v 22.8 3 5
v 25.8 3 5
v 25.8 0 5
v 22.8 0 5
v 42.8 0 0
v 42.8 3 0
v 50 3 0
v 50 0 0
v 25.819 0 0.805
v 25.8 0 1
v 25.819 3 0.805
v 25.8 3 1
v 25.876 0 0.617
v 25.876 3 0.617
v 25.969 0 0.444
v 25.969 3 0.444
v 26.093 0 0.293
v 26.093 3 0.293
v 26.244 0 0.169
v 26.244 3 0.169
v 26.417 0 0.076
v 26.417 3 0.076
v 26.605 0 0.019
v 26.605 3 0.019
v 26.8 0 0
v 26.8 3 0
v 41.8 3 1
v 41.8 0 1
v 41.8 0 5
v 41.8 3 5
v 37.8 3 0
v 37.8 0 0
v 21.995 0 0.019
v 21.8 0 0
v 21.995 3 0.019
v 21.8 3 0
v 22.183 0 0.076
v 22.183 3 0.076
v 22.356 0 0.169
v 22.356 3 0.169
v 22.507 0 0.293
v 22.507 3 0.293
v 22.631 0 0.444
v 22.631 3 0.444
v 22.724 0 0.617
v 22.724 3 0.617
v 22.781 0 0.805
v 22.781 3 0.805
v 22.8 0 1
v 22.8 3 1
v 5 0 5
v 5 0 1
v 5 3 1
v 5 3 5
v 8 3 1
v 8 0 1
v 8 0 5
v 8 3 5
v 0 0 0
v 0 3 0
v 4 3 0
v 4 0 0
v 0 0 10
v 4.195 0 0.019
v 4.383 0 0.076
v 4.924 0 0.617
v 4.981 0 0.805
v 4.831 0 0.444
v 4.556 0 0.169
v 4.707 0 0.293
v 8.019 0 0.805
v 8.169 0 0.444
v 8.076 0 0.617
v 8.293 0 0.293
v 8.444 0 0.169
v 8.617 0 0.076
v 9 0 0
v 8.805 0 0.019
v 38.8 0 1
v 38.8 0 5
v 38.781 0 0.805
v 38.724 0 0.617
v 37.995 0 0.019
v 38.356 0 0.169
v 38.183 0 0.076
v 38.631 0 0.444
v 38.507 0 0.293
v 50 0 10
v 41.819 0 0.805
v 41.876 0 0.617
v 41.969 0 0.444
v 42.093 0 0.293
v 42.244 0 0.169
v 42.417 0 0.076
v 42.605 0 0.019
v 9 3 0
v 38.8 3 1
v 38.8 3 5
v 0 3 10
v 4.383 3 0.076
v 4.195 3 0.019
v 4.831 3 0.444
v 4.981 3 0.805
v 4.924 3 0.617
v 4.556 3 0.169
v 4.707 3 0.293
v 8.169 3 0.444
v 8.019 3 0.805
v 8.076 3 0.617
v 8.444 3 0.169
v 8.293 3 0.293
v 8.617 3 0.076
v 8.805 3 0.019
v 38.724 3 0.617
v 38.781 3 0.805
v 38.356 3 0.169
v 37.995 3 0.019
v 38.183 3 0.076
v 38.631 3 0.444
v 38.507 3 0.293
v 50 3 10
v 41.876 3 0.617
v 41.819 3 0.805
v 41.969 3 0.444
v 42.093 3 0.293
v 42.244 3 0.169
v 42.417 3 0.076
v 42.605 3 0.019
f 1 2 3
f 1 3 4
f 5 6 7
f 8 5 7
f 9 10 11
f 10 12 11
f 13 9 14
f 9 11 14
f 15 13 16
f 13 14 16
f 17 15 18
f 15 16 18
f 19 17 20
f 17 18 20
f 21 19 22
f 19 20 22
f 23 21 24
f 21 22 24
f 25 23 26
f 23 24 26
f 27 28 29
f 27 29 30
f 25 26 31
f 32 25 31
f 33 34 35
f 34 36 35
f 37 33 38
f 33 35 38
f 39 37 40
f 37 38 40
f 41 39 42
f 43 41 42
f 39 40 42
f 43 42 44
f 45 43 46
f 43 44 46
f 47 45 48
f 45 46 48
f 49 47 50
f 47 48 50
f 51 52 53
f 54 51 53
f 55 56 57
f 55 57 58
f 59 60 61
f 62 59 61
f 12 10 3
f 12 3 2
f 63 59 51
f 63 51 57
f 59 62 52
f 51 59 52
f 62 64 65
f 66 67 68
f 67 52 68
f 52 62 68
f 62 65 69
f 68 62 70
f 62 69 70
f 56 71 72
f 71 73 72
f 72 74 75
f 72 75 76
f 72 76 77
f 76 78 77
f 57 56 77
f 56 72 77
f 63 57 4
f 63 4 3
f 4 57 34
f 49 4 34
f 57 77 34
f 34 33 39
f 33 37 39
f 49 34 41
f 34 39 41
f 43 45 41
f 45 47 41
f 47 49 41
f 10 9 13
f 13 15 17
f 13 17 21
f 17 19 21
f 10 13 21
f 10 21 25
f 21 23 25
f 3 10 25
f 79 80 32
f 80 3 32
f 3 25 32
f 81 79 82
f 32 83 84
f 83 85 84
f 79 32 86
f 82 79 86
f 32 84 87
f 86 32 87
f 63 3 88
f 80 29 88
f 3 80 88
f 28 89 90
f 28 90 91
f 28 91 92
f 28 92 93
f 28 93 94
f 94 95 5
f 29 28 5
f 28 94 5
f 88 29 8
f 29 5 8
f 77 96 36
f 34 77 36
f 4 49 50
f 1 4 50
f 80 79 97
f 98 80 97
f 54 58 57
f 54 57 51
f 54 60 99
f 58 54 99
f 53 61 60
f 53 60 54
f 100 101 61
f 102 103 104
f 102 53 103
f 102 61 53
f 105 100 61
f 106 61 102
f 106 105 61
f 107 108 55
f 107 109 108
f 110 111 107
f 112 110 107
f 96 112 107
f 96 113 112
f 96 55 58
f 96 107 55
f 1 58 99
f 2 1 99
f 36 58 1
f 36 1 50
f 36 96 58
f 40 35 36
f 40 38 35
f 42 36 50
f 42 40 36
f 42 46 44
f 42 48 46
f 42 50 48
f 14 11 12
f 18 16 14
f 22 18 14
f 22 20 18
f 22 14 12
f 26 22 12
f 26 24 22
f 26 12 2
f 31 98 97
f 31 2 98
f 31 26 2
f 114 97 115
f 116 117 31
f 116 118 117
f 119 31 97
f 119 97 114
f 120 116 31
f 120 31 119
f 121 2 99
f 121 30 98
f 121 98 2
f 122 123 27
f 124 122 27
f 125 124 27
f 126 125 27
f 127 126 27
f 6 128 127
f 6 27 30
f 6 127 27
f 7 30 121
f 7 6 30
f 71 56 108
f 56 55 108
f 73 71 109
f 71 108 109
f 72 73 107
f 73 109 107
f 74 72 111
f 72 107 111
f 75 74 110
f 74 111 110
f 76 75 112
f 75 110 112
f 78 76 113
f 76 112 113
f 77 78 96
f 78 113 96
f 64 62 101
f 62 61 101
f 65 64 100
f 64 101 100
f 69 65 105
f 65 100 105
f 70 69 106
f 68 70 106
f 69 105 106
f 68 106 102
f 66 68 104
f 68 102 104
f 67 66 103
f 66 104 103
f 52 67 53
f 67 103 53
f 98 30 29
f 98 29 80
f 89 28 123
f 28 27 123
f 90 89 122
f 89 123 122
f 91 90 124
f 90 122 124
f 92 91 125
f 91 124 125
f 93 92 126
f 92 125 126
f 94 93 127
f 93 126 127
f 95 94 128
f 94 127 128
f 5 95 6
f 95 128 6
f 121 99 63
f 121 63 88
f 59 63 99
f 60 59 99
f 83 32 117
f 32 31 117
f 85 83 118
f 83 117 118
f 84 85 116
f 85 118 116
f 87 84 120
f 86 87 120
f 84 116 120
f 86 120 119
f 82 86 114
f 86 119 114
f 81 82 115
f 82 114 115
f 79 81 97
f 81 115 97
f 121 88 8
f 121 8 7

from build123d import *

# Parameters (mm, degrees)
SKETCH1_W           = 50
SKETCH1_H           = 3
BOSS_EXTRUDE1_DEPTH = 10
SKETCH3_W           = 3
SKETCH3_H           = 3
CUT_EXTRUDE2_DEPTH  = 5
FILLET2_R           = 1


with BuildPart() as part:
    # Sketch1 → Boss-Extrude1 (new body)
    with BuildSketch(Plane.XY):
        with Locations((25, 1.5)):
            Rectangle(SKETCH1_W, SKETCH1_H)
    extrude(amount=BOSS_EXTRUDE1_DEPTH)

    # Sketch3 → Cut-Extrude2 (cut)
    with BuildSketch(Plane(origin=(0, 0, 0), x_dir=(-1, 0, 0), z_dir=(0, 0, -1))):
        with Locations((-81.3, 1.5)):
            Rectangle(SKETCH3_W, SKETCH3_H)
        with Locations((-60.3, 1.5)):
            Rectangle(SKETCH3_W, SKETCH3_H)
        with Locations((-40.3, 1.5)):
            Rectangle(SKETCH3_W, SKETCH3_H)
        with Locations((-24.3, 1.5)):
            Rectangle(SKETCH3_W, SKETCH3_H)
        with Locations((-6.5, 1.5)):
            Rectangle(SKETCH3_W, SKETCH3_H)
    extrude(amount=-CUT_EXTRUDE2_DEPTH, mode=Mode.SUBTRACT)

    # Fillet2
    fillet2_edges = [part.edges().sort_by_distance(p)[0] for p in [
        (38.8, 1.5, 0),
        (41.8, 1.5, 0),
        (22.8, 1.5, 0),
        (25.8, 1.5, 0),
        (5, 1.5, 0),
        (8, 1.5, 0),
    ]]
    fillet(fillet2_edges, radius=FILLET2_R)


solid = part.part
